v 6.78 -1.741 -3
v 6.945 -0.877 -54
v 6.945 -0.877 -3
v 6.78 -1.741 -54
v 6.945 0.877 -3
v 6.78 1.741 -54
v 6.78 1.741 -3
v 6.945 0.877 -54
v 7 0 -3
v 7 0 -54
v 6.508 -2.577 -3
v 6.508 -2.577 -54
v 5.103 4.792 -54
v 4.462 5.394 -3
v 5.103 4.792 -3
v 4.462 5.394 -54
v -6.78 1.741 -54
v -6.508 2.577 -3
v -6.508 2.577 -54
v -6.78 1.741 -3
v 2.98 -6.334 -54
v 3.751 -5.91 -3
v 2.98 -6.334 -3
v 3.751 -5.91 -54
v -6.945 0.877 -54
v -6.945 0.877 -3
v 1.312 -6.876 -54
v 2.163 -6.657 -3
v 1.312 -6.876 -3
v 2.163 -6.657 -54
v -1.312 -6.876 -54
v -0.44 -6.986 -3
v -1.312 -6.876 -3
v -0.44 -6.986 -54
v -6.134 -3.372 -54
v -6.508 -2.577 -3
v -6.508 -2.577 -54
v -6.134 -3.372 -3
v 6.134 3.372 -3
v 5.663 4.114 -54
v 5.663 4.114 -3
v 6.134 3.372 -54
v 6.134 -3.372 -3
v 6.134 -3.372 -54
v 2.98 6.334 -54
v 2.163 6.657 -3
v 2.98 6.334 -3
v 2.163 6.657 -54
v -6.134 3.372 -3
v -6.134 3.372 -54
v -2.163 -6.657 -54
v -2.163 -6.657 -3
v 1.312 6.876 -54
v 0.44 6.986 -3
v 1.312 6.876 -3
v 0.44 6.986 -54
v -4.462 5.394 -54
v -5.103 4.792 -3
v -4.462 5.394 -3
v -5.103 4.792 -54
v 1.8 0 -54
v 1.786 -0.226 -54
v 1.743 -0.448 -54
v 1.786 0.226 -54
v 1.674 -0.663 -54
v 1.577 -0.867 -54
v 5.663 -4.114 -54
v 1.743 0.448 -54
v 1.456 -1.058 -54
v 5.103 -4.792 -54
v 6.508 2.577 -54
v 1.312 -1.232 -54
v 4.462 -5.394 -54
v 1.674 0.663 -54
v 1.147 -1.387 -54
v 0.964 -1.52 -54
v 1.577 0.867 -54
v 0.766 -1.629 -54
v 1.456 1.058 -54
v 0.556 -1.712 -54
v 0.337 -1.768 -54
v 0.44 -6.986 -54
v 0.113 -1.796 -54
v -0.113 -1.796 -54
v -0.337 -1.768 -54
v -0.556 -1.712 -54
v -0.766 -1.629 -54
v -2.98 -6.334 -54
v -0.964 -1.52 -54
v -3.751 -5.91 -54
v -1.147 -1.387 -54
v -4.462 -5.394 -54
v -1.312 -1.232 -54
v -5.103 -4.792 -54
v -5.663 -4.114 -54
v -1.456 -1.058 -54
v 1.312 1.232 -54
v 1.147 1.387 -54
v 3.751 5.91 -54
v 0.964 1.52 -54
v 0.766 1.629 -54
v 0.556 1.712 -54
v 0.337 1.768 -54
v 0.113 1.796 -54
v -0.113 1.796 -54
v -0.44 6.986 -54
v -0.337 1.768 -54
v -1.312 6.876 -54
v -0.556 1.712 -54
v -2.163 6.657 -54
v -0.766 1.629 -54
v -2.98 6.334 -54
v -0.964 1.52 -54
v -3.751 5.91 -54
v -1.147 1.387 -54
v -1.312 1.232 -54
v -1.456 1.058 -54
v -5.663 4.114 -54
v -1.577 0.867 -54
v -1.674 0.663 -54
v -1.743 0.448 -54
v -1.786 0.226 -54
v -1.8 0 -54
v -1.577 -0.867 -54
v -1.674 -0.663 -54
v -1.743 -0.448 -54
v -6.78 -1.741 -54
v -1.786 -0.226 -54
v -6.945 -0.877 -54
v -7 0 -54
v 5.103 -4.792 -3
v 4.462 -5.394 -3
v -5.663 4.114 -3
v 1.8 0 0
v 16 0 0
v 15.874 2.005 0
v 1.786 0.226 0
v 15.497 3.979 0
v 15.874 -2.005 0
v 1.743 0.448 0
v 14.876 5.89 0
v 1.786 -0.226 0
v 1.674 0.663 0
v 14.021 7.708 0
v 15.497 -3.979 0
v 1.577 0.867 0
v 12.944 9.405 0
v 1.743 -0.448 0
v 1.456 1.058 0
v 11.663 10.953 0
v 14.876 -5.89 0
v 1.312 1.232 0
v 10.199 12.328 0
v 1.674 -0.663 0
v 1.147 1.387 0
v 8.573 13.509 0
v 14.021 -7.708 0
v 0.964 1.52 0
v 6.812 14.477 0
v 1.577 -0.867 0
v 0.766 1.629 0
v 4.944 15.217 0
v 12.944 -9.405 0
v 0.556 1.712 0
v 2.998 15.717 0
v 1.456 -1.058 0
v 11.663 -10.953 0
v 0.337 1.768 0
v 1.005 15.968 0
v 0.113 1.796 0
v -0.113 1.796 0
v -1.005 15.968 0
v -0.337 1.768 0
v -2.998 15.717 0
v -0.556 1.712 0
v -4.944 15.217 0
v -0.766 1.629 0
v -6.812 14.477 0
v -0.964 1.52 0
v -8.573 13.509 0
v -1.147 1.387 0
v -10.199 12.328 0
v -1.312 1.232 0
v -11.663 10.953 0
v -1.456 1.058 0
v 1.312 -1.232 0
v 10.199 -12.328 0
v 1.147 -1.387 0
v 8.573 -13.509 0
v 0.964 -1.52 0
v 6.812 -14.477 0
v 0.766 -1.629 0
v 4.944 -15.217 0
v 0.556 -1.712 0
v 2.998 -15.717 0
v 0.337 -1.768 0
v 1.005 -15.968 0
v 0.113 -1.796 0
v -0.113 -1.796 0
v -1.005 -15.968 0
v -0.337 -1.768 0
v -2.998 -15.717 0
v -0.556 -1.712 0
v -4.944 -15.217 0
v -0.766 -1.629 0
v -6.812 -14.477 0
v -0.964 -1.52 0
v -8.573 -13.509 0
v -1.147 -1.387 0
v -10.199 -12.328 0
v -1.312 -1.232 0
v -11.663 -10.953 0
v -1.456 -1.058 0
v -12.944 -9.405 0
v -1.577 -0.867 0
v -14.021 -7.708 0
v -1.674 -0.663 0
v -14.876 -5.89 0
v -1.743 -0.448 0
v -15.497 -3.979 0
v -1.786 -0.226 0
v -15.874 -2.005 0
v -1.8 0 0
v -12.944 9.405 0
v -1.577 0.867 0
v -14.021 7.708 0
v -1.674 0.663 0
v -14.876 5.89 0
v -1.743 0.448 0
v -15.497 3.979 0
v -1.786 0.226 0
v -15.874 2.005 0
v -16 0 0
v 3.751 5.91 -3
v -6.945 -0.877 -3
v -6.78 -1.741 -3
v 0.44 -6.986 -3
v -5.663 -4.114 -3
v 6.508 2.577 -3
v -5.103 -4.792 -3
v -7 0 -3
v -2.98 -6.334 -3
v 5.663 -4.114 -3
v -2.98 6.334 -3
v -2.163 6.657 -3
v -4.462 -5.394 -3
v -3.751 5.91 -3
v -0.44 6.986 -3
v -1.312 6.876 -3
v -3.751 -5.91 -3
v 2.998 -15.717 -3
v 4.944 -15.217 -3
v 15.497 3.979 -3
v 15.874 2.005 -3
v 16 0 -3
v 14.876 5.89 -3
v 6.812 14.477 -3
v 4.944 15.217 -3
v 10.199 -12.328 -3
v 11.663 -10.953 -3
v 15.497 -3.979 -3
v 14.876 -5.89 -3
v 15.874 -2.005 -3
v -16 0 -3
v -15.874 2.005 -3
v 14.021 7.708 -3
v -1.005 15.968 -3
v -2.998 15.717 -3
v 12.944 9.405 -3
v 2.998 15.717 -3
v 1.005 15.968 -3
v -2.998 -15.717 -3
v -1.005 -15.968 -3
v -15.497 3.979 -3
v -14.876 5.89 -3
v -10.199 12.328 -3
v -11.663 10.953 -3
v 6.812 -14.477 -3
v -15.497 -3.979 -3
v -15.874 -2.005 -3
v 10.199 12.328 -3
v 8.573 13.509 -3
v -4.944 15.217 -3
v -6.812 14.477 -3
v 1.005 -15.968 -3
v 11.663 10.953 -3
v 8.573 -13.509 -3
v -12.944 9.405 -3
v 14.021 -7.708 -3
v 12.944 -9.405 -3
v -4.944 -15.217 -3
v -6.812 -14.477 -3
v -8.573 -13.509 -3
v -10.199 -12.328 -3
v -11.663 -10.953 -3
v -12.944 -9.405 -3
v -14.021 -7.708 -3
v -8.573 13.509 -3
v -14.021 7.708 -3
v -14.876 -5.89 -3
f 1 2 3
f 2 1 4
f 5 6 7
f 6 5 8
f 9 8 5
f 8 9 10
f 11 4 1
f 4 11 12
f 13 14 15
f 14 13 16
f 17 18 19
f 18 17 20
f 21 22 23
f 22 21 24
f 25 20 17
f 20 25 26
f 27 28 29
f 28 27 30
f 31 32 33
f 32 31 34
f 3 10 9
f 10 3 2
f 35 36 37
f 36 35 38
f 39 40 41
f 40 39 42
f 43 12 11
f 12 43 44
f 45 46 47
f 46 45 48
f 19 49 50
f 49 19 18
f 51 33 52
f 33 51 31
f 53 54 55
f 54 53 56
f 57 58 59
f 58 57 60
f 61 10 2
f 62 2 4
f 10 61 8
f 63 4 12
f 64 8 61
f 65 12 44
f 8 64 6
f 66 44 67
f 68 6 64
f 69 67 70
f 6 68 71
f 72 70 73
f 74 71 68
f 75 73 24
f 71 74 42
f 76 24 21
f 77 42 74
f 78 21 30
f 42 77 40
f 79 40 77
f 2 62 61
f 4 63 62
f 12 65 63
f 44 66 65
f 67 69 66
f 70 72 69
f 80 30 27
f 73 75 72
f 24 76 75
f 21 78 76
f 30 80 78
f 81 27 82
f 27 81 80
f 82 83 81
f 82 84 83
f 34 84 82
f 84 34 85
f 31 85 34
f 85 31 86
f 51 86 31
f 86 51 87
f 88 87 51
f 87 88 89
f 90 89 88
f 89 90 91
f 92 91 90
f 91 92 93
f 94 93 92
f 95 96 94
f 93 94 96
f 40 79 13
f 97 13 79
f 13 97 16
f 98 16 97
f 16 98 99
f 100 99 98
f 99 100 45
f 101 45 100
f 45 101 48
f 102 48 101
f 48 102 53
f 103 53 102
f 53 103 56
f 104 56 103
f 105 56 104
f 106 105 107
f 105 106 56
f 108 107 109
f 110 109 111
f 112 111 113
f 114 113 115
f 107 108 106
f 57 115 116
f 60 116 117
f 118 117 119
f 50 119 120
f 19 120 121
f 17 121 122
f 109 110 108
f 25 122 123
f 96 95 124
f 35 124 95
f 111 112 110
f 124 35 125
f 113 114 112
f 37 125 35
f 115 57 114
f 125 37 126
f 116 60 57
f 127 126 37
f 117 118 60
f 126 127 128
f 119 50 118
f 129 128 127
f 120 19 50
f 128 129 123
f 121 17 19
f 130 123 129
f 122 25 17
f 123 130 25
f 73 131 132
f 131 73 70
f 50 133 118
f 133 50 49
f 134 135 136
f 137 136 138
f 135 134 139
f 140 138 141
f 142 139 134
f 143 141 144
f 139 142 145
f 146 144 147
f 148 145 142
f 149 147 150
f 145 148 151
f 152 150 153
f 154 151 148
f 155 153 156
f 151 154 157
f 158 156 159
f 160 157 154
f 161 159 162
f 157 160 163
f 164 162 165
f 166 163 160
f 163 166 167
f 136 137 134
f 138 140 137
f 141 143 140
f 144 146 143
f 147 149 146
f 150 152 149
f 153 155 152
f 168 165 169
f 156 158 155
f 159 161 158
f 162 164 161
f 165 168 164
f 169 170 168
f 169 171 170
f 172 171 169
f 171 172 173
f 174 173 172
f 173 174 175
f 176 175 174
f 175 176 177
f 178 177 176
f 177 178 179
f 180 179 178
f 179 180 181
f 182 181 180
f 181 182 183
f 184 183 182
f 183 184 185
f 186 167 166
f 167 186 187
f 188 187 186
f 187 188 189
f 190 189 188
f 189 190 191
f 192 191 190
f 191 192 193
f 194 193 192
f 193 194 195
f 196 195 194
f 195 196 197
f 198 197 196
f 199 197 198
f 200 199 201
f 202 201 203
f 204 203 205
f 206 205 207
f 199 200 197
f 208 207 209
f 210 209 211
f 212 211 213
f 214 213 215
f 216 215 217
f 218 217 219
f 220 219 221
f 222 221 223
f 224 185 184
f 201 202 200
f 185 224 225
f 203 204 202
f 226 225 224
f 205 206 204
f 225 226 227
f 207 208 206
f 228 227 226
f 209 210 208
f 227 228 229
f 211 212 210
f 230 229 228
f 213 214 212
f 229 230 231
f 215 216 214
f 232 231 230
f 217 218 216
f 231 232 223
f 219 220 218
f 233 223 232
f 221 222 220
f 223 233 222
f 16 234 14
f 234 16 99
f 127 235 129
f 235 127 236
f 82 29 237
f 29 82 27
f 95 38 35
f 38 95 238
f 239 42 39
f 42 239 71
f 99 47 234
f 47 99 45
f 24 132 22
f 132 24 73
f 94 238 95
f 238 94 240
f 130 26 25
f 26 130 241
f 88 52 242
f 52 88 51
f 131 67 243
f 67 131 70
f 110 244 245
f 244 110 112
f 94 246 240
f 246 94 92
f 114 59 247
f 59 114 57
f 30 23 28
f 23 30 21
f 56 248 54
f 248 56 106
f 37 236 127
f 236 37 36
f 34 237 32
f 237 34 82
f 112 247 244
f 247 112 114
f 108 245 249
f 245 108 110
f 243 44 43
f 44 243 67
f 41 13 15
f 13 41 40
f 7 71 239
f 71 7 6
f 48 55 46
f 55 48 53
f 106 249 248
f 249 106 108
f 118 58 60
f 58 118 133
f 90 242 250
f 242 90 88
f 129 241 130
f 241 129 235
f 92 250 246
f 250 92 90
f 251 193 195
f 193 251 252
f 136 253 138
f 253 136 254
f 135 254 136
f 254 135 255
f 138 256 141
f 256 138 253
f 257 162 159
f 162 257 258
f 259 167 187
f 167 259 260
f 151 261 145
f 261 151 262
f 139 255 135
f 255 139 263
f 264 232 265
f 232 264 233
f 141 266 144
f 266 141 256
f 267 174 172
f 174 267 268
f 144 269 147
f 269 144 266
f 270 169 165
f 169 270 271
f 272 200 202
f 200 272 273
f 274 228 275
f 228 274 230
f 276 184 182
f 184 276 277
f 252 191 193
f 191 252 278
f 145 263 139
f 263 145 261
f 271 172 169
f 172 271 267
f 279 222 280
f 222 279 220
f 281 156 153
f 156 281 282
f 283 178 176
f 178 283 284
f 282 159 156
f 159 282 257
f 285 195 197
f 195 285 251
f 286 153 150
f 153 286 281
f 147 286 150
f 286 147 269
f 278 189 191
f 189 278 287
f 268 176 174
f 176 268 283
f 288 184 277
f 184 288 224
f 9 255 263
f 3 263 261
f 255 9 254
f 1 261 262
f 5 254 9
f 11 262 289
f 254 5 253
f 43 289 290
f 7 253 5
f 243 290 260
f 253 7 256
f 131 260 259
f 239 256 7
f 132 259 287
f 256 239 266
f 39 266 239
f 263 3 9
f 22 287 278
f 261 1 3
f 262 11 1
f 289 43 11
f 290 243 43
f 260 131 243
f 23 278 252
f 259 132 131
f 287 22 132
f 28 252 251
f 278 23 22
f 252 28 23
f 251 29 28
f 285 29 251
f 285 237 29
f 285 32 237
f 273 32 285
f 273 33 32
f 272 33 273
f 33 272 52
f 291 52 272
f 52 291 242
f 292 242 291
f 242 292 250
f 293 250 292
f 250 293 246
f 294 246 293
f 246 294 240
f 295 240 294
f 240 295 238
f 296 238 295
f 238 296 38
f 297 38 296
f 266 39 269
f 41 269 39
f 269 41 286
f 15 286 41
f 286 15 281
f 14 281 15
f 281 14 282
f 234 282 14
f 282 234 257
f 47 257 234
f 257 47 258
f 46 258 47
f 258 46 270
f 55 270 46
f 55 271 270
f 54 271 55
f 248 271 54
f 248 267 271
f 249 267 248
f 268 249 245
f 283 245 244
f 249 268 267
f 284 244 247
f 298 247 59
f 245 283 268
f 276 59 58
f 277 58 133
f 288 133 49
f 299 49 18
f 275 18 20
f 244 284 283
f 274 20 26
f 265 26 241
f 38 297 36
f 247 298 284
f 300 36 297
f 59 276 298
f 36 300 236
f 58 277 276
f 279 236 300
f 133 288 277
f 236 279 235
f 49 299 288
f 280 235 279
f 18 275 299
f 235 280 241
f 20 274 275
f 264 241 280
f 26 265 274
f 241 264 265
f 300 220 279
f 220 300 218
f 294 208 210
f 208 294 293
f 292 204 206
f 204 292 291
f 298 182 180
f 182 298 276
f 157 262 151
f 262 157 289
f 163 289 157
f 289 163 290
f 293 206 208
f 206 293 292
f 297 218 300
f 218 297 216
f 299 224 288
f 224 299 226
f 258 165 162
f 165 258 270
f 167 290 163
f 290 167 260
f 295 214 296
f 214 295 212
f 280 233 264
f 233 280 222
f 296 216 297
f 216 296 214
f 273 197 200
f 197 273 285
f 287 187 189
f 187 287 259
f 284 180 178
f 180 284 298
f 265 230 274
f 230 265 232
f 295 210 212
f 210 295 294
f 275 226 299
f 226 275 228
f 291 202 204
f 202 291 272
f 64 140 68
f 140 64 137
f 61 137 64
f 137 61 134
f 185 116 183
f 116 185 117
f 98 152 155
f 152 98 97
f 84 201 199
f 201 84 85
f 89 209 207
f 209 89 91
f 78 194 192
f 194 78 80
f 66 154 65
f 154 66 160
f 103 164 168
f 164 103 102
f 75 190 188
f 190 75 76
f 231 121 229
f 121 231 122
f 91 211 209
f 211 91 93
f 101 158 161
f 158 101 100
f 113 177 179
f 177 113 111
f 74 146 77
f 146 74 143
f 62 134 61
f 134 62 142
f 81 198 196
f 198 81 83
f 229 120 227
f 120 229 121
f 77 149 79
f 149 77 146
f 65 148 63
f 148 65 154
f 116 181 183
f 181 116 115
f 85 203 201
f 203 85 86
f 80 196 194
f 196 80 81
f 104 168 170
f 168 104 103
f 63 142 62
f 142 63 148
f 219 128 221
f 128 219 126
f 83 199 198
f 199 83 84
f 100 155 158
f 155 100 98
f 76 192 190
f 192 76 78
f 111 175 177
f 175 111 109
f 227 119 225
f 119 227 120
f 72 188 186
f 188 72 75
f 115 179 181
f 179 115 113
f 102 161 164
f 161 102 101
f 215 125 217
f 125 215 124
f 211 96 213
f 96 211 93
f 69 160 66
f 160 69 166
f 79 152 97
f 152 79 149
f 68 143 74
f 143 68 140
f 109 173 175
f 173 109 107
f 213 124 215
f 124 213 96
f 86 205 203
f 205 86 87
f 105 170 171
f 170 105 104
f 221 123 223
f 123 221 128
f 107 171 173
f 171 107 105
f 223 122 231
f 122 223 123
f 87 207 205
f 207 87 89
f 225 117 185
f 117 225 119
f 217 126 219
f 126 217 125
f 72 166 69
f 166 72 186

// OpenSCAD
$fn = 50;


difference() {
	union() {
		translate(v = [0, 0, -54.0000000000]) {
			cylinder(h = 54, r = 7.0000000000);
		}
		translate(v = [0, 0, -3.0000000000]) {
			cylinder(h = 3, r = 16.0000000000);
		}
	}
	union() {
		#translate(v = [0, 0, -54]) {
			cylinder(h = 54, r = 1.8000000000);
		}
	}
}
